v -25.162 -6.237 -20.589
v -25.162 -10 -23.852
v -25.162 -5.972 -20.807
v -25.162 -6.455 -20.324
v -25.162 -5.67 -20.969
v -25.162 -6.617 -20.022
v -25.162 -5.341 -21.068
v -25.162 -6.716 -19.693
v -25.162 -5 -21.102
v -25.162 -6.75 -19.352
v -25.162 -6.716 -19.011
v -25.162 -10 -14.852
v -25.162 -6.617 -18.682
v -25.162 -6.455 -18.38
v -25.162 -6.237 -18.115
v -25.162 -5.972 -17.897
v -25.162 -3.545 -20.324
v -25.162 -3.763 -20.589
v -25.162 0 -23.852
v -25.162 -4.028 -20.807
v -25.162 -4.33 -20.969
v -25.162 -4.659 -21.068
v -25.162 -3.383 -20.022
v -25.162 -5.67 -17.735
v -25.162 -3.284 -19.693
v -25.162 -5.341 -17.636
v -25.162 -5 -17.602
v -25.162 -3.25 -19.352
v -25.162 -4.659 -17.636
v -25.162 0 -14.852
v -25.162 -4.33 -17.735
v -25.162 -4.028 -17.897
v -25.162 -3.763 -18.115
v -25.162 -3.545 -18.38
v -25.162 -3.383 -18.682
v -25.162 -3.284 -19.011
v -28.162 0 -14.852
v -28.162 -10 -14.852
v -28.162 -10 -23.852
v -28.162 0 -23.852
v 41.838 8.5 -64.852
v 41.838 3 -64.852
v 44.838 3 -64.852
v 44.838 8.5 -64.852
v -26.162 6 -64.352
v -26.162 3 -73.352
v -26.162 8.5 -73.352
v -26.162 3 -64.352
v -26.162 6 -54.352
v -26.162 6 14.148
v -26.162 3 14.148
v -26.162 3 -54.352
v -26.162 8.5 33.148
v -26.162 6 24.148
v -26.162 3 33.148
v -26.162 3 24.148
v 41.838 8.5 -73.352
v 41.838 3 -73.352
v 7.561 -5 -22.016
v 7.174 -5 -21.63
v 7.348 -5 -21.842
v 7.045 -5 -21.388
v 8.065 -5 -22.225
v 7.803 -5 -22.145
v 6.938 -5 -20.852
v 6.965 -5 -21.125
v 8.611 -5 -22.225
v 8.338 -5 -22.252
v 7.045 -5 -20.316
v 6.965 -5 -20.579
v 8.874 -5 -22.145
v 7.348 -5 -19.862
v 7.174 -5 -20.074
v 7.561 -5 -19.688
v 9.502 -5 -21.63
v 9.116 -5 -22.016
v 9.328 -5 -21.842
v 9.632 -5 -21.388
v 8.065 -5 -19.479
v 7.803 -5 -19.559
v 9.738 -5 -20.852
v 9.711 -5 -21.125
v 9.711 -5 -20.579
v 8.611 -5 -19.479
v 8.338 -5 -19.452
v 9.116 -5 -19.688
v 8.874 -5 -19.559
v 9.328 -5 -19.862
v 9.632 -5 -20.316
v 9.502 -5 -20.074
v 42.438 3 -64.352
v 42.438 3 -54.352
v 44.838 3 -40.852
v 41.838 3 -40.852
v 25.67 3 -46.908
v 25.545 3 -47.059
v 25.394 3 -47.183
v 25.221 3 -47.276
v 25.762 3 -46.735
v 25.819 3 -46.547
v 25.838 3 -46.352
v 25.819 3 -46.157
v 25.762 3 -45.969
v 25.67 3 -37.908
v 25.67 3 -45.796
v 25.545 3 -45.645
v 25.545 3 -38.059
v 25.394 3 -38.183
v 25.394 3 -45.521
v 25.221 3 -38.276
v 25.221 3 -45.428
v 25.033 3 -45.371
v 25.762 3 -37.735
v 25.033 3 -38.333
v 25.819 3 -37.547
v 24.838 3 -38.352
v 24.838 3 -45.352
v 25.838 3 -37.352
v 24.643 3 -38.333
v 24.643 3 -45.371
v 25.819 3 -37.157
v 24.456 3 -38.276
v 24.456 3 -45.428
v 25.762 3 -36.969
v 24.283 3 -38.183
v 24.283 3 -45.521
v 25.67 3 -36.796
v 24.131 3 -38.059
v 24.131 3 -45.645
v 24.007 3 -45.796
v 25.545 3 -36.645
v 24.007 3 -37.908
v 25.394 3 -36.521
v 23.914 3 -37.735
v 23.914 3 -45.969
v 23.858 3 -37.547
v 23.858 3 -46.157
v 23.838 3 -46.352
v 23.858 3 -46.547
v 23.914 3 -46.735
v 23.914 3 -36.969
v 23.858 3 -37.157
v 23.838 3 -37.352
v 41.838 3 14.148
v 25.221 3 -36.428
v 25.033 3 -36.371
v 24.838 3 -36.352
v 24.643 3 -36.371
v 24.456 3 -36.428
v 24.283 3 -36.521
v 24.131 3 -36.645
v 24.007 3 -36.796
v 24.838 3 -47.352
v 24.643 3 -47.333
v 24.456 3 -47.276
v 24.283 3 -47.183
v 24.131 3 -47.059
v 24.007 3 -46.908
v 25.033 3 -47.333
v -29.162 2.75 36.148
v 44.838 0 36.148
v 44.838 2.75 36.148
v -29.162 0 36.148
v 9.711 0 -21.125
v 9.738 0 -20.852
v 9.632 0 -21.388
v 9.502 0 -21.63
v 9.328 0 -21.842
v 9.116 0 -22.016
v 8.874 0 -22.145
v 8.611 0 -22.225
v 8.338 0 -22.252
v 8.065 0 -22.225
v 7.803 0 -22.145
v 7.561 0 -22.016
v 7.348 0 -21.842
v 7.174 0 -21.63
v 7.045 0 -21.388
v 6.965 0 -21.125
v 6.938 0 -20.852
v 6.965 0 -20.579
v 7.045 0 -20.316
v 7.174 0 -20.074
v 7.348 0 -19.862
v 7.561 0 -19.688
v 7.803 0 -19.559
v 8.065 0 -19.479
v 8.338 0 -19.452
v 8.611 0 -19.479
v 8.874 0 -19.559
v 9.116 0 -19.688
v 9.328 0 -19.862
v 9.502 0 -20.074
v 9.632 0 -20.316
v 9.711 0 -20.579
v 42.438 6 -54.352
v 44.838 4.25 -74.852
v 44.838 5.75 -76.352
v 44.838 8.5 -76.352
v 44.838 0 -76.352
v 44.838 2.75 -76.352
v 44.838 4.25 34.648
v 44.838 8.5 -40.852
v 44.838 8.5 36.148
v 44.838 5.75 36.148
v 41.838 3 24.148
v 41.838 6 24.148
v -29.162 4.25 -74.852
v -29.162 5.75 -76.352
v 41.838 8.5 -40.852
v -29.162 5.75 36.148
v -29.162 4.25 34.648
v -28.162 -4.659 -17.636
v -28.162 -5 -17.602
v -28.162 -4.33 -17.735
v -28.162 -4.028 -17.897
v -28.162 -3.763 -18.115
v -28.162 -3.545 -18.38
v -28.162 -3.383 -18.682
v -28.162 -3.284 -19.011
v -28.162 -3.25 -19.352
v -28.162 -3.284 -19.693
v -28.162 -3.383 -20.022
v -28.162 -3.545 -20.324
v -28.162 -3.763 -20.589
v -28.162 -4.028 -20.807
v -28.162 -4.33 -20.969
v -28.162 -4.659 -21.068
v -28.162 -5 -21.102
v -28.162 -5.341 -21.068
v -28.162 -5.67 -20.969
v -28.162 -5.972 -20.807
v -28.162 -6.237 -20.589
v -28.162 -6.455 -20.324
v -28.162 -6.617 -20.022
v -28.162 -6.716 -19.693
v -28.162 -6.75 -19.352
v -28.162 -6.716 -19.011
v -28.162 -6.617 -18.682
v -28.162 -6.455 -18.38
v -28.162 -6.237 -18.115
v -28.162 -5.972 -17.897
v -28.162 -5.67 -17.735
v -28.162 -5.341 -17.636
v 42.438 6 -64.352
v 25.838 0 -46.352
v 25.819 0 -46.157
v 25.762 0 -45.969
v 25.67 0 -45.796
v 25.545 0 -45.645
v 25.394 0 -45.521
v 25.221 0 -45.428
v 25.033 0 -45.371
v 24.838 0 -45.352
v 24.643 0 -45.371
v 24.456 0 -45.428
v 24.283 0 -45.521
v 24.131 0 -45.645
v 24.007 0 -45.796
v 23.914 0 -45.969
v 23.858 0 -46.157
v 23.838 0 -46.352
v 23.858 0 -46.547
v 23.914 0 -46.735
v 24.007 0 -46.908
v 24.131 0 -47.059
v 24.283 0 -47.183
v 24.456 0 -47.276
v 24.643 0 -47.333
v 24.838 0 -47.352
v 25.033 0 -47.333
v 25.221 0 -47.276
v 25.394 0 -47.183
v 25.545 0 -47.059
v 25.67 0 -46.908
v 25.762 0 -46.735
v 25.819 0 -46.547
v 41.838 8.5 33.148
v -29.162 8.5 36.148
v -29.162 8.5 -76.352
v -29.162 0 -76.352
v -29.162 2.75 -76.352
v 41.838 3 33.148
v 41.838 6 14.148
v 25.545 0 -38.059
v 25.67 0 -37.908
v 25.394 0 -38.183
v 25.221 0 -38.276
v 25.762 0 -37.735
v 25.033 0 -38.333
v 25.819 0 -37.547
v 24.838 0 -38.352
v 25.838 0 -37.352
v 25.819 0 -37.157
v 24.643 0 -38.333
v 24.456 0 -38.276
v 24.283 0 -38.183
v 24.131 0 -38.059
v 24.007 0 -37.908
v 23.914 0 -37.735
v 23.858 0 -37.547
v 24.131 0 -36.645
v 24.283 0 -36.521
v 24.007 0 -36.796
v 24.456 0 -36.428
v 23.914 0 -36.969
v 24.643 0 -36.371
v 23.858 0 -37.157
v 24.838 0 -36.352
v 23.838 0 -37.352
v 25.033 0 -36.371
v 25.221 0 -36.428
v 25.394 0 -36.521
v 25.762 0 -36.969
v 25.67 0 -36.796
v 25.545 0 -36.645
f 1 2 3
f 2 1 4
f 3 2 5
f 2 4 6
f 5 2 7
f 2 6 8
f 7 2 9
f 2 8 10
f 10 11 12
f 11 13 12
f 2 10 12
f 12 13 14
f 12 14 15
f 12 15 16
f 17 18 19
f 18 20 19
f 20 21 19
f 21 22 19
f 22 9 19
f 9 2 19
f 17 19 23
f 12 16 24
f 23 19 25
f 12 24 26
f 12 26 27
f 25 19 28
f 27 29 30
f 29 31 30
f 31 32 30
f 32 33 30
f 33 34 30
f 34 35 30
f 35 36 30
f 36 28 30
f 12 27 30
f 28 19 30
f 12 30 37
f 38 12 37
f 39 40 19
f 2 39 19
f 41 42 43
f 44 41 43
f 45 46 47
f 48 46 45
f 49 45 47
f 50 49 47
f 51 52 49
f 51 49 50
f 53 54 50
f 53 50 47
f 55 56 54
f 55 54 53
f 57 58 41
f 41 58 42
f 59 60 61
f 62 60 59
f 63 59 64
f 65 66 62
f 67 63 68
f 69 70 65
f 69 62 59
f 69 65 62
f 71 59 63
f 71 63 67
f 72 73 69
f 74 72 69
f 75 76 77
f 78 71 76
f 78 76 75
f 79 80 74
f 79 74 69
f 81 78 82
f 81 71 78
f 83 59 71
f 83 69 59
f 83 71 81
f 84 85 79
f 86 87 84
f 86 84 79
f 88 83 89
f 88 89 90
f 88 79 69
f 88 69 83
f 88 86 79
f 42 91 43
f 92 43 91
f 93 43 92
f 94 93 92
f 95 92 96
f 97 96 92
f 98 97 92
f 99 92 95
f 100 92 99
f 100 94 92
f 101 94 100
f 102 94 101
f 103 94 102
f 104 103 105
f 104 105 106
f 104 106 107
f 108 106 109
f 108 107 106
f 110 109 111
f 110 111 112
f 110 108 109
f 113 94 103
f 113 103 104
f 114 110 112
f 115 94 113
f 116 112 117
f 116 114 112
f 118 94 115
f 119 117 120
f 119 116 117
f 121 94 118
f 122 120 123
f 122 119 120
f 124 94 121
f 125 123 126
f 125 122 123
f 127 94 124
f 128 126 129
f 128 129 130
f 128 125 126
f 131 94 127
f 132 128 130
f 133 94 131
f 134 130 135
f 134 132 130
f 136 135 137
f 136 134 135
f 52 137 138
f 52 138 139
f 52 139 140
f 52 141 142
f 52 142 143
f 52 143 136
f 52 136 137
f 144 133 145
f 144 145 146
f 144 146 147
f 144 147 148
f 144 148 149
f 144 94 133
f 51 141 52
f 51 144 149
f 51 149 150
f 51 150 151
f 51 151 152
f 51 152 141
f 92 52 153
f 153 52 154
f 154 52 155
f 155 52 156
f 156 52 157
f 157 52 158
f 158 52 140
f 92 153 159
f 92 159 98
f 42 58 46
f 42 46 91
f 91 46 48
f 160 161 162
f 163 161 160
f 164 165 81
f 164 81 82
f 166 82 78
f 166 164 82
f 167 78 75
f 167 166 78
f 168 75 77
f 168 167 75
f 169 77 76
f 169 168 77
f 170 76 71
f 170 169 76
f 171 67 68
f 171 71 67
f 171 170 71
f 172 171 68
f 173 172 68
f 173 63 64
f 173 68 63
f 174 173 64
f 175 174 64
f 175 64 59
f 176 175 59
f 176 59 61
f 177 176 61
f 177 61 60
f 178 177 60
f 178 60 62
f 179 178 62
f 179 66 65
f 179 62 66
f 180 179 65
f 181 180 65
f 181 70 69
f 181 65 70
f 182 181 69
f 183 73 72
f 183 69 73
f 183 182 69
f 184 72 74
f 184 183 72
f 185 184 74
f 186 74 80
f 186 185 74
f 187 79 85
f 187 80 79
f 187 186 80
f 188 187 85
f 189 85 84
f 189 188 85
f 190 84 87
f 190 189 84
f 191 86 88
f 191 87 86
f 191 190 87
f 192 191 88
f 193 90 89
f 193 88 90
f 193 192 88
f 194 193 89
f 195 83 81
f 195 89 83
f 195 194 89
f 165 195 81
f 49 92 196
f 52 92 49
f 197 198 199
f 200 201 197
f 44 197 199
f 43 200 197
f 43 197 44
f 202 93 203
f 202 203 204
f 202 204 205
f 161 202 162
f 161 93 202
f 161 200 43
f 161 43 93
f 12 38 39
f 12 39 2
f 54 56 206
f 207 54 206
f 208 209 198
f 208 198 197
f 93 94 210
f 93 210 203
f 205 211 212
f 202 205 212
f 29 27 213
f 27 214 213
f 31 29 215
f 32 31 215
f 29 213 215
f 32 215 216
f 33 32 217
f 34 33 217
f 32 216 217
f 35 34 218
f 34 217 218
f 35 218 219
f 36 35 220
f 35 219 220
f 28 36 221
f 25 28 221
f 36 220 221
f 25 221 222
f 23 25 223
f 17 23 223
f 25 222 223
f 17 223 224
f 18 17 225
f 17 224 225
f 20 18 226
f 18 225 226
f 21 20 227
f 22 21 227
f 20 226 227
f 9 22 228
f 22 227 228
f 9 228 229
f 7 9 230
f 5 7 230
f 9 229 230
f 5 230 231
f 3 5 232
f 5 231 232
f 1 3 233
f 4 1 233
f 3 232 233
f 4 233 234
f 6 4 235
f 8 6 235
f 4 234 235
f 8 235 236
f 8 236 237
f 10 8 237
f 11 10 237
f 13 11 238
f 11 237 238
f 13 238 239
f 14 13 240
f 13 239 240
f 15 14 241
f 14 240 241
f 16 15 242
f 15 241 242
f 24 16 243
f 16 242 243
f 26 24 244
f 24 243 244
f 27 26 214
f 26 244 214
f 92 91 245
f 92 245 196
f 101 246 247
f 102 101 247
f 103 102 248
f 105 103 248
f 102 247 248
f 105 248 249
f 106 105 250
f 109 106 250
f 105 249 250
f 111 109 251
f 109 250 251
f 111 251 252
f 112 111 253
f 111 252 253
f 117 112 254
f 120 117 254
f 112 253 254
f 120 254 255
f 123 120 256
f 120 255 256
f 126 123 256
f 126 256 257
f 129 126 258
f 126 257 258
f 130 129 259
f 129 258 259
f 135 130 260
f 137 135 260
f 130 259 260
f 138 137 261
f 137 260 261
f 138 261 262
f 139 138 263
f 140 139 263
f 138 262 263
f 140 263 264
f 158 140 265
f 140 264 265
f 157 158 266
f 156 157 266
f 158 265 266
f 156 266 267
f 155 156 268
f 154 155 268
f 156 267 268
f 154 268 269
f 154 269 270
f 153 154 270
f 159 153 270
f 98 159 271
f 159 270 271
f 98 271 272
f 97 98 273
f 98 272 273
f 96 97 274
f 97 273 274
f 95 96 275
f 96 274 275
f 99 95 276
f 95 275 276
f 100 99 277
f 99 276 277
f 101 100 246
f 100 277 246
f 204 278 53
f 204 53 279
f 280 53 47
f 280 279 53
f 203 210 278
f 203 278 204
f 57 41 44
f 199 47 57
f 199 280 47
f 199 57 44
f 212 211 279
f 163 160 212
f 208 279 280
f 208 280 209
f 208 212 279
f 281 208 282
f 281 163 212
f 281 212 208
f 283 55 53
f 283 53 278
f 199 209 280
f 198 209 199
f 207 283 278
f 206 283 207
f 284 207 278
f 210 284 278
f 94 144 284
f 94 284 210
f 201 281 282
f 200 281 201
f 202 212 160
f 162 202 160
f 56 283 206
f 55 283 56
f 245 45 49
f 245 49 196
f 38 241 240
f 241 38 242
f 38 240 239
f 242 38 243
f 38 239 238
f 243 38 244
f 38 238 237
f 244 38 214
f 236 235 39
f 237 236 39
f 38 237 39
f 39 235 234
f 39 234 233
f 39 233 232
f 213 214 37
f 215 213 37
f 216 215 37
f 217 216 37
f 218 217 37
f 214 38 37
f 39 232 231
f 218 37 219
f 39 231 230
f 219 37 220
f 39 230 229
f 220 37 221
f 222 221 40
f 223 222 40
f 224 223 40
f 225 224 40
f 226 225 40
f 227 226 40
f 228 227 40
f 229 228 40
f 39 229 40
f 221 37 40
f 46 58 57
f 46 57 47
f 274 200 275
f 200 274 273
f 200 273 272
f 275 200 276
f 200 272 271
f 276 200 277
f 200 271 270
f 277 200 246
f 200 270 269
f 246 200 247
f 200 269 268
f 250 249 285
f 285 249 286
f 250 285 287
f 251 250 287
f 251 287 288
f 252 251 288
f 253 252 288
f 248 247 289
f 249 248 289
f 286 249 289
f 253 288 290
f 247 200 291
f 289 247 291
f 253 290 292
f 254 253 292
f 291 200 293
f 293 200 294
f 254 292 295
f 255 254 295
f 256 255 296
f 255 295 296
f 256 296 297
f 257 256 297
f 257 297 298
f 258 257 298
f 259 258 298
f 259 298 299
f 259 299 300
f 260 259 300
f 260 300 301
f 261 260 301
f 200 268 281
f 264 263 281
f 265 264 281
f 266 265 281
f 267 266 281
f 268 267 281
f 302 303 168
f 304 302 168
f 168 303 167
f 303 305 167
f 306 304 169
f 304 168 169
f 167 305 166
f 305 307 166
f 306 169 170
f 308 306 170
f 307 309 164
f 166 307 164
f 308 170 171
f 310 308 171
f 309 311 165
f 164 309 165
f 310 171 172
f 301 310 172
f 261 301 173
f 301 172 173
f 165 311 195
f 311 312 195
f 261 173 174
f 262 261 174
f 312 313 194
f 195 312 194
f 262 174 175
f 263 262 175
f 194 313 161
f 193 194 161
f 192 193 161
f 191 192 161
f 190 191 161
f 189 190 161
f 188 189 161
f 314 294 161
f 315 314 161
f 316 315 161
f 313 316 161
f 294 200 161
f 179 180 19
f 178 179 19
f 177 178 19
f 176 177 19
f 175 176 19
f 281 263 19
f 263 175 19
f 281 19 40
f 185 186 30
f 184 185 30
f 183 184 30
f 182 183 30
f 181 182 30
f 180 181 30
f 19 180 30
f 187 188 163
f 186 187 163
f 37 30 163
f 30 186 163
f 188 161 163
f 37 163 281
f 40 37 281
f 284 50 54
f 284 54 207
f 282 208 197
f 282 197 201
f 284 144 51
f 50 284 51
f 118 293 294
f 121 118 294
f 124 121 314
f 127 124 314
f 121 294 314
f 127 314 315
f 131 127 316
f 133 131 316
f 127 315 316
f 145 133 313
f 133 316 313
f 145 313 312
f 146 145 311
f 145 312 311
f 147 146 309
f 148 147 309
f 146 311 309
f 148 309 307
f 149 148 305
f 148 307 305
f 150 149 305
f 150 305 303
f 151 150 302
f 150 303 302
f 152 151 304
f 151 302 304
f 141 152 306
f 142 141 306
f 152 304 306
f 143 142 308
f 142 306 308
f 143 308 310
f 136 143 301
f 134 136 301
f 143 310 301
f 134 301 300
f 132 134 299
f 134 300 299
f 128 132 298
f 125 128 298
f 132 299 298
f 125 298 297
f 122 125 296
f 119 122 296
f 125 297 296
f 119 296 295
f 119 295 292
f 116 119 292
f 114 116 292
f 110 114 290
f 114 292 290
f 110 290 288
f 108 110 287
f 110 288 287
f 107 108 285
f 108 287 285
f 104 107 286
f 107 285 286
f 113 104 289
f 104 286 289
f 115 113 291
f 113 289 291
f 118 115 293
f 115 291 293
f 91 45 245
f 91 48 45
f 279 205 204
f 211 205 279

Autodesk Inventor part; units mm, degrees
ref_plane "YZ Plane" through (0, 0, 0) normal (1, 0, 0) x (0, 1, 0)
ref_plane "XZ Plane" through (0, 0, 0) normal (0, 1, 0) x (-1, 0, 0)
ref_plane "XY Plane" through (0, 0, 0) normal (0, 0, 1) x (1, 0, 0)
sketch "Sketch36" plane through (0, 0, 0) normal (0, 1, 0) x (-1, 0, 0)
  line L0 (29.1617, 36.148) -> (29.1617, -76.352)
  line L1 (29.1617, -76.352) -> (-44.8383, -76.352)
  line L2 (-44.8383, -76.352) -> (-44.8383, 36.148)
  line L3 (-44.8383, 36.148) -> (29.1617, 36.148)
  point P0 (0, 0)
  dimension "d191" = 112.5
  dimension "d192" = 74
extrude "Extrusion21" add sketch "Sketch36" along normal blind 3
sketch "Sketch37" plane through (0, 3, 0) normal (0, 1, 0) x (1, 0, 0)
  line L0 (-29.1617, 76.352) -> (-29.1617, -36.148) projected
  line L1 (-29.1617, -36.148) -> (-29.1617, 76.352)
  line L2 (44.8383, -36.148) -> (44.8383, 76.352) projected
  line L3 (-29.1617, 76.352) -> (44.8383, 76.352)
  line L4 (44.8383, 76.352) -> (44.8383, -36.148)
  line L5 (-29.1617, -36.148) -> (44.8383, -36.148) projected
  line L6 (44.8383, -36.148) -> (-29.1617, -36.148)
  line L7 (-26.1617, -33.148) -> (41.8383, -33.148)
  line L8 (41.8383, 73.352) -> (-26.1617, 73.352)
  line L9 (-26.1617, 73.352) -> (-26.1617, -33.148)
  line L10 (41.8383, -33.148) -> (41.8383, 40.852)
  line L11 (41.8383, 40.852) -> (44.8383, 40.852)
  line L12 (41.8383, 73.352) -> (41.8383, 64.852)
  line L13 (41.8383, 64.852) -> (44.8383, 64.852)
  point P0 (0, 0)
  point P1 (43.3383, 64.852)
  dimension "d195" = 3
  dimension "d197" = 3
  dimension "d198" = 3
  dimension "d199" = 3
  dimension "d203" = 8.5
  dimension "d261" = 24
extrude "Extrusion22" add sketch "Sketch37" along normal blind 5.5 contours L3 L2 L13 L12 L8 L9 L7 L10 L11 L5 L0
sketch "Sketch39" plane through (0, 0, 0) normal (0, -1, 0) x (1, 0, 0)
  circle A0 centre (8.3383, -20.852) radius 1.4 projected
  line L0 (-29.1617, -76.352) -> (-29.1617, 36.148) projected
  line L1 (44.8383, 36.148) -> (44.8383, -76.352) projected
  line L2 (-25.1617, -14.852) -> (-28.1617, -14.852)
  line L3 (-28.1617, -14.852) -> (-28.1617, -23.852)
  line L4 (-28.1617, -23.852) -> (-25.1617, -23.852)
  line L5 (-25.1617, -23.852) -> (-25.1617, -14.852)
  line L6 (-29.1617, 36.148) -> (44.8383, 36.148) projected
  point P0 (0, 0)
  dimension "d217" = 9
  dimension "d218" = 3
  dimension "d295" = 36.5
  dimension "d296" = 51
extrude "Extrusion25" add sketch "Sketch39" along normal blind 10 contours L5 L4 L3 L2
sketch "Sketch43" plane through (0, 0, 0) normal (0, -1, 0) x (1, 0, 0)
  circle A0 centre (24.8383, -37.352) radius 1
  circle A1 centre (24.8383, -46.352) radius 1
  line L0 (44.8383, -76.352) -> (-29.1617, -76.352) projected
  circle A2 centre (8.3383, -20.852) radius 1.4 projected
  line L1 (-29.1617, 36.148) -> (44.8383, 36.148) projected
  line L2 (44.8383, 36.148) -> (44.8383, -76.352) projected
  point P0 (0, 0)
  dimension "d252" = 2
  dimension "d253" = 2
  dimension "d254" = 9
  dimension "d256" = 30
  dimension "d258" = 20
extrude "Extrusion29" cut sketch "Sketch43" against normal blind 10 contours A0 | A1
sketch "Sketch45" plane through (0, 3, 0) normal (0, 1, 0) x (1, 0, 0)
  line L0 (41.8383, -33.148) -> (41.8383, 40.852) projected
  line L1 (41.8383, -14.148) -> (-26.1617, -14.148)
  line L2 (-26.1617, 73.352) -> (-26.1617, -33.148) projected
  line L3 (-26.1617, -24.148) -> (41.8383, -24.148)
  line L4 (41.8383, -24.148) -> (41.8383, -14.148)
  line L5 (41.8383, -33.148) -> (-26.1617, -33.148) projected
  line L6 (-26.1617, 64.352) -> (42.4383, 64.352)
  line L7 (42.4383, 64.352) -> (42.4383, 54.352)
  line L8 (42.4383, 54.352) -> (-26.1617, 54.352)
  line L9 (-26.1617, 64.352) -> (-26.1617, 54.352)
  line L10 (-26.1617, 73.352) -> (41.8383, 73.352) projected
  point P0 (0, 0)
  point P1 (41.8383, -24.148)
  dimension "d274" = 10
  dimension "d275" = 9
  dimension "d276" = 9
  dimension "d277" = 10
extrude "Extrusion31" add sketch "Sketch45" along normal blind 3 contours L2 L6 L7 L8 | L3 L2 L1 L0
sketch "Sketch48" plane through (-29.1617, 0, 36.148) normal (-1, 0, 0) x (0, 0, 1)
  circle A0 centre (-55.5, -5) radius 1.75
  line L0 (-51, 0) -> (-51, -10) projected
  line L1 (-51, -10) -> (-60, -10) projected
  point P0 (-36.148, 0)
  dimension "d297" = 3.5
  dimension "d298" = 4.5
  dimension "d299" = 5
extrude "Extrusion34" cut sketch "Sketch48" against normal blind 10
sketch "Sketch50" plane through (44.8383, 0, 36.148) normal (1, 0, 0) x (0, 0, -1)
  line L0 (0, 0) -> (0, 8.5) projected
  line L1 (0, 5.75) -> (1.5, 4.25)
  line L2 (1.5, 4.25) -> (0, 2.75)
  line L3 (0, 8.5) -> (77, 8.5) projected
  point P0 (36.148, 0)
  dimension "d307" = 4.25
  dimension "d314" = 45
  dimension "d316" = 1.5
extrude "Extrusion36" cut sketch "Sketch50" against normal blind 75
sketch "Sketch51" plane through (44.8383, 0, 36.148) normal (1, 0, 0) x (0, 0, -1)
  line L0 (112.5, 0) -> (112.5, 8.5) projected
  line L1 (112.5, 5.75) -> (111, 4.25)
  line L2 (111, 4.25) -> (112.5, 2.75)
  line L3 (101, 8.5) -> (112.5, 8.5) projected
  point P0 (36.148, 0)
  dimension "d317" = 45
  dimension "d318" = 45
  dimension "d319" = 4.25
  dimension "d320" = 1.5
extrude "Extrusion37" cut sketch "Sketch51" against normal blind 75
sketch "Sketch52" plane through (0, 0, 0) normal (0, -1, 0) x (1, 0, 0)
  circle A0 centre (8.3383, -20.852) radius 1.4 projected
  circle A1 centre (8.3383, -20.852) radius 1.4
  point P0 (0, 0)
  dimension "d324" = 2.8
extrude "Extrusion38" add sketch "Sketch52" along normal blind 5
properties part number "plate"
